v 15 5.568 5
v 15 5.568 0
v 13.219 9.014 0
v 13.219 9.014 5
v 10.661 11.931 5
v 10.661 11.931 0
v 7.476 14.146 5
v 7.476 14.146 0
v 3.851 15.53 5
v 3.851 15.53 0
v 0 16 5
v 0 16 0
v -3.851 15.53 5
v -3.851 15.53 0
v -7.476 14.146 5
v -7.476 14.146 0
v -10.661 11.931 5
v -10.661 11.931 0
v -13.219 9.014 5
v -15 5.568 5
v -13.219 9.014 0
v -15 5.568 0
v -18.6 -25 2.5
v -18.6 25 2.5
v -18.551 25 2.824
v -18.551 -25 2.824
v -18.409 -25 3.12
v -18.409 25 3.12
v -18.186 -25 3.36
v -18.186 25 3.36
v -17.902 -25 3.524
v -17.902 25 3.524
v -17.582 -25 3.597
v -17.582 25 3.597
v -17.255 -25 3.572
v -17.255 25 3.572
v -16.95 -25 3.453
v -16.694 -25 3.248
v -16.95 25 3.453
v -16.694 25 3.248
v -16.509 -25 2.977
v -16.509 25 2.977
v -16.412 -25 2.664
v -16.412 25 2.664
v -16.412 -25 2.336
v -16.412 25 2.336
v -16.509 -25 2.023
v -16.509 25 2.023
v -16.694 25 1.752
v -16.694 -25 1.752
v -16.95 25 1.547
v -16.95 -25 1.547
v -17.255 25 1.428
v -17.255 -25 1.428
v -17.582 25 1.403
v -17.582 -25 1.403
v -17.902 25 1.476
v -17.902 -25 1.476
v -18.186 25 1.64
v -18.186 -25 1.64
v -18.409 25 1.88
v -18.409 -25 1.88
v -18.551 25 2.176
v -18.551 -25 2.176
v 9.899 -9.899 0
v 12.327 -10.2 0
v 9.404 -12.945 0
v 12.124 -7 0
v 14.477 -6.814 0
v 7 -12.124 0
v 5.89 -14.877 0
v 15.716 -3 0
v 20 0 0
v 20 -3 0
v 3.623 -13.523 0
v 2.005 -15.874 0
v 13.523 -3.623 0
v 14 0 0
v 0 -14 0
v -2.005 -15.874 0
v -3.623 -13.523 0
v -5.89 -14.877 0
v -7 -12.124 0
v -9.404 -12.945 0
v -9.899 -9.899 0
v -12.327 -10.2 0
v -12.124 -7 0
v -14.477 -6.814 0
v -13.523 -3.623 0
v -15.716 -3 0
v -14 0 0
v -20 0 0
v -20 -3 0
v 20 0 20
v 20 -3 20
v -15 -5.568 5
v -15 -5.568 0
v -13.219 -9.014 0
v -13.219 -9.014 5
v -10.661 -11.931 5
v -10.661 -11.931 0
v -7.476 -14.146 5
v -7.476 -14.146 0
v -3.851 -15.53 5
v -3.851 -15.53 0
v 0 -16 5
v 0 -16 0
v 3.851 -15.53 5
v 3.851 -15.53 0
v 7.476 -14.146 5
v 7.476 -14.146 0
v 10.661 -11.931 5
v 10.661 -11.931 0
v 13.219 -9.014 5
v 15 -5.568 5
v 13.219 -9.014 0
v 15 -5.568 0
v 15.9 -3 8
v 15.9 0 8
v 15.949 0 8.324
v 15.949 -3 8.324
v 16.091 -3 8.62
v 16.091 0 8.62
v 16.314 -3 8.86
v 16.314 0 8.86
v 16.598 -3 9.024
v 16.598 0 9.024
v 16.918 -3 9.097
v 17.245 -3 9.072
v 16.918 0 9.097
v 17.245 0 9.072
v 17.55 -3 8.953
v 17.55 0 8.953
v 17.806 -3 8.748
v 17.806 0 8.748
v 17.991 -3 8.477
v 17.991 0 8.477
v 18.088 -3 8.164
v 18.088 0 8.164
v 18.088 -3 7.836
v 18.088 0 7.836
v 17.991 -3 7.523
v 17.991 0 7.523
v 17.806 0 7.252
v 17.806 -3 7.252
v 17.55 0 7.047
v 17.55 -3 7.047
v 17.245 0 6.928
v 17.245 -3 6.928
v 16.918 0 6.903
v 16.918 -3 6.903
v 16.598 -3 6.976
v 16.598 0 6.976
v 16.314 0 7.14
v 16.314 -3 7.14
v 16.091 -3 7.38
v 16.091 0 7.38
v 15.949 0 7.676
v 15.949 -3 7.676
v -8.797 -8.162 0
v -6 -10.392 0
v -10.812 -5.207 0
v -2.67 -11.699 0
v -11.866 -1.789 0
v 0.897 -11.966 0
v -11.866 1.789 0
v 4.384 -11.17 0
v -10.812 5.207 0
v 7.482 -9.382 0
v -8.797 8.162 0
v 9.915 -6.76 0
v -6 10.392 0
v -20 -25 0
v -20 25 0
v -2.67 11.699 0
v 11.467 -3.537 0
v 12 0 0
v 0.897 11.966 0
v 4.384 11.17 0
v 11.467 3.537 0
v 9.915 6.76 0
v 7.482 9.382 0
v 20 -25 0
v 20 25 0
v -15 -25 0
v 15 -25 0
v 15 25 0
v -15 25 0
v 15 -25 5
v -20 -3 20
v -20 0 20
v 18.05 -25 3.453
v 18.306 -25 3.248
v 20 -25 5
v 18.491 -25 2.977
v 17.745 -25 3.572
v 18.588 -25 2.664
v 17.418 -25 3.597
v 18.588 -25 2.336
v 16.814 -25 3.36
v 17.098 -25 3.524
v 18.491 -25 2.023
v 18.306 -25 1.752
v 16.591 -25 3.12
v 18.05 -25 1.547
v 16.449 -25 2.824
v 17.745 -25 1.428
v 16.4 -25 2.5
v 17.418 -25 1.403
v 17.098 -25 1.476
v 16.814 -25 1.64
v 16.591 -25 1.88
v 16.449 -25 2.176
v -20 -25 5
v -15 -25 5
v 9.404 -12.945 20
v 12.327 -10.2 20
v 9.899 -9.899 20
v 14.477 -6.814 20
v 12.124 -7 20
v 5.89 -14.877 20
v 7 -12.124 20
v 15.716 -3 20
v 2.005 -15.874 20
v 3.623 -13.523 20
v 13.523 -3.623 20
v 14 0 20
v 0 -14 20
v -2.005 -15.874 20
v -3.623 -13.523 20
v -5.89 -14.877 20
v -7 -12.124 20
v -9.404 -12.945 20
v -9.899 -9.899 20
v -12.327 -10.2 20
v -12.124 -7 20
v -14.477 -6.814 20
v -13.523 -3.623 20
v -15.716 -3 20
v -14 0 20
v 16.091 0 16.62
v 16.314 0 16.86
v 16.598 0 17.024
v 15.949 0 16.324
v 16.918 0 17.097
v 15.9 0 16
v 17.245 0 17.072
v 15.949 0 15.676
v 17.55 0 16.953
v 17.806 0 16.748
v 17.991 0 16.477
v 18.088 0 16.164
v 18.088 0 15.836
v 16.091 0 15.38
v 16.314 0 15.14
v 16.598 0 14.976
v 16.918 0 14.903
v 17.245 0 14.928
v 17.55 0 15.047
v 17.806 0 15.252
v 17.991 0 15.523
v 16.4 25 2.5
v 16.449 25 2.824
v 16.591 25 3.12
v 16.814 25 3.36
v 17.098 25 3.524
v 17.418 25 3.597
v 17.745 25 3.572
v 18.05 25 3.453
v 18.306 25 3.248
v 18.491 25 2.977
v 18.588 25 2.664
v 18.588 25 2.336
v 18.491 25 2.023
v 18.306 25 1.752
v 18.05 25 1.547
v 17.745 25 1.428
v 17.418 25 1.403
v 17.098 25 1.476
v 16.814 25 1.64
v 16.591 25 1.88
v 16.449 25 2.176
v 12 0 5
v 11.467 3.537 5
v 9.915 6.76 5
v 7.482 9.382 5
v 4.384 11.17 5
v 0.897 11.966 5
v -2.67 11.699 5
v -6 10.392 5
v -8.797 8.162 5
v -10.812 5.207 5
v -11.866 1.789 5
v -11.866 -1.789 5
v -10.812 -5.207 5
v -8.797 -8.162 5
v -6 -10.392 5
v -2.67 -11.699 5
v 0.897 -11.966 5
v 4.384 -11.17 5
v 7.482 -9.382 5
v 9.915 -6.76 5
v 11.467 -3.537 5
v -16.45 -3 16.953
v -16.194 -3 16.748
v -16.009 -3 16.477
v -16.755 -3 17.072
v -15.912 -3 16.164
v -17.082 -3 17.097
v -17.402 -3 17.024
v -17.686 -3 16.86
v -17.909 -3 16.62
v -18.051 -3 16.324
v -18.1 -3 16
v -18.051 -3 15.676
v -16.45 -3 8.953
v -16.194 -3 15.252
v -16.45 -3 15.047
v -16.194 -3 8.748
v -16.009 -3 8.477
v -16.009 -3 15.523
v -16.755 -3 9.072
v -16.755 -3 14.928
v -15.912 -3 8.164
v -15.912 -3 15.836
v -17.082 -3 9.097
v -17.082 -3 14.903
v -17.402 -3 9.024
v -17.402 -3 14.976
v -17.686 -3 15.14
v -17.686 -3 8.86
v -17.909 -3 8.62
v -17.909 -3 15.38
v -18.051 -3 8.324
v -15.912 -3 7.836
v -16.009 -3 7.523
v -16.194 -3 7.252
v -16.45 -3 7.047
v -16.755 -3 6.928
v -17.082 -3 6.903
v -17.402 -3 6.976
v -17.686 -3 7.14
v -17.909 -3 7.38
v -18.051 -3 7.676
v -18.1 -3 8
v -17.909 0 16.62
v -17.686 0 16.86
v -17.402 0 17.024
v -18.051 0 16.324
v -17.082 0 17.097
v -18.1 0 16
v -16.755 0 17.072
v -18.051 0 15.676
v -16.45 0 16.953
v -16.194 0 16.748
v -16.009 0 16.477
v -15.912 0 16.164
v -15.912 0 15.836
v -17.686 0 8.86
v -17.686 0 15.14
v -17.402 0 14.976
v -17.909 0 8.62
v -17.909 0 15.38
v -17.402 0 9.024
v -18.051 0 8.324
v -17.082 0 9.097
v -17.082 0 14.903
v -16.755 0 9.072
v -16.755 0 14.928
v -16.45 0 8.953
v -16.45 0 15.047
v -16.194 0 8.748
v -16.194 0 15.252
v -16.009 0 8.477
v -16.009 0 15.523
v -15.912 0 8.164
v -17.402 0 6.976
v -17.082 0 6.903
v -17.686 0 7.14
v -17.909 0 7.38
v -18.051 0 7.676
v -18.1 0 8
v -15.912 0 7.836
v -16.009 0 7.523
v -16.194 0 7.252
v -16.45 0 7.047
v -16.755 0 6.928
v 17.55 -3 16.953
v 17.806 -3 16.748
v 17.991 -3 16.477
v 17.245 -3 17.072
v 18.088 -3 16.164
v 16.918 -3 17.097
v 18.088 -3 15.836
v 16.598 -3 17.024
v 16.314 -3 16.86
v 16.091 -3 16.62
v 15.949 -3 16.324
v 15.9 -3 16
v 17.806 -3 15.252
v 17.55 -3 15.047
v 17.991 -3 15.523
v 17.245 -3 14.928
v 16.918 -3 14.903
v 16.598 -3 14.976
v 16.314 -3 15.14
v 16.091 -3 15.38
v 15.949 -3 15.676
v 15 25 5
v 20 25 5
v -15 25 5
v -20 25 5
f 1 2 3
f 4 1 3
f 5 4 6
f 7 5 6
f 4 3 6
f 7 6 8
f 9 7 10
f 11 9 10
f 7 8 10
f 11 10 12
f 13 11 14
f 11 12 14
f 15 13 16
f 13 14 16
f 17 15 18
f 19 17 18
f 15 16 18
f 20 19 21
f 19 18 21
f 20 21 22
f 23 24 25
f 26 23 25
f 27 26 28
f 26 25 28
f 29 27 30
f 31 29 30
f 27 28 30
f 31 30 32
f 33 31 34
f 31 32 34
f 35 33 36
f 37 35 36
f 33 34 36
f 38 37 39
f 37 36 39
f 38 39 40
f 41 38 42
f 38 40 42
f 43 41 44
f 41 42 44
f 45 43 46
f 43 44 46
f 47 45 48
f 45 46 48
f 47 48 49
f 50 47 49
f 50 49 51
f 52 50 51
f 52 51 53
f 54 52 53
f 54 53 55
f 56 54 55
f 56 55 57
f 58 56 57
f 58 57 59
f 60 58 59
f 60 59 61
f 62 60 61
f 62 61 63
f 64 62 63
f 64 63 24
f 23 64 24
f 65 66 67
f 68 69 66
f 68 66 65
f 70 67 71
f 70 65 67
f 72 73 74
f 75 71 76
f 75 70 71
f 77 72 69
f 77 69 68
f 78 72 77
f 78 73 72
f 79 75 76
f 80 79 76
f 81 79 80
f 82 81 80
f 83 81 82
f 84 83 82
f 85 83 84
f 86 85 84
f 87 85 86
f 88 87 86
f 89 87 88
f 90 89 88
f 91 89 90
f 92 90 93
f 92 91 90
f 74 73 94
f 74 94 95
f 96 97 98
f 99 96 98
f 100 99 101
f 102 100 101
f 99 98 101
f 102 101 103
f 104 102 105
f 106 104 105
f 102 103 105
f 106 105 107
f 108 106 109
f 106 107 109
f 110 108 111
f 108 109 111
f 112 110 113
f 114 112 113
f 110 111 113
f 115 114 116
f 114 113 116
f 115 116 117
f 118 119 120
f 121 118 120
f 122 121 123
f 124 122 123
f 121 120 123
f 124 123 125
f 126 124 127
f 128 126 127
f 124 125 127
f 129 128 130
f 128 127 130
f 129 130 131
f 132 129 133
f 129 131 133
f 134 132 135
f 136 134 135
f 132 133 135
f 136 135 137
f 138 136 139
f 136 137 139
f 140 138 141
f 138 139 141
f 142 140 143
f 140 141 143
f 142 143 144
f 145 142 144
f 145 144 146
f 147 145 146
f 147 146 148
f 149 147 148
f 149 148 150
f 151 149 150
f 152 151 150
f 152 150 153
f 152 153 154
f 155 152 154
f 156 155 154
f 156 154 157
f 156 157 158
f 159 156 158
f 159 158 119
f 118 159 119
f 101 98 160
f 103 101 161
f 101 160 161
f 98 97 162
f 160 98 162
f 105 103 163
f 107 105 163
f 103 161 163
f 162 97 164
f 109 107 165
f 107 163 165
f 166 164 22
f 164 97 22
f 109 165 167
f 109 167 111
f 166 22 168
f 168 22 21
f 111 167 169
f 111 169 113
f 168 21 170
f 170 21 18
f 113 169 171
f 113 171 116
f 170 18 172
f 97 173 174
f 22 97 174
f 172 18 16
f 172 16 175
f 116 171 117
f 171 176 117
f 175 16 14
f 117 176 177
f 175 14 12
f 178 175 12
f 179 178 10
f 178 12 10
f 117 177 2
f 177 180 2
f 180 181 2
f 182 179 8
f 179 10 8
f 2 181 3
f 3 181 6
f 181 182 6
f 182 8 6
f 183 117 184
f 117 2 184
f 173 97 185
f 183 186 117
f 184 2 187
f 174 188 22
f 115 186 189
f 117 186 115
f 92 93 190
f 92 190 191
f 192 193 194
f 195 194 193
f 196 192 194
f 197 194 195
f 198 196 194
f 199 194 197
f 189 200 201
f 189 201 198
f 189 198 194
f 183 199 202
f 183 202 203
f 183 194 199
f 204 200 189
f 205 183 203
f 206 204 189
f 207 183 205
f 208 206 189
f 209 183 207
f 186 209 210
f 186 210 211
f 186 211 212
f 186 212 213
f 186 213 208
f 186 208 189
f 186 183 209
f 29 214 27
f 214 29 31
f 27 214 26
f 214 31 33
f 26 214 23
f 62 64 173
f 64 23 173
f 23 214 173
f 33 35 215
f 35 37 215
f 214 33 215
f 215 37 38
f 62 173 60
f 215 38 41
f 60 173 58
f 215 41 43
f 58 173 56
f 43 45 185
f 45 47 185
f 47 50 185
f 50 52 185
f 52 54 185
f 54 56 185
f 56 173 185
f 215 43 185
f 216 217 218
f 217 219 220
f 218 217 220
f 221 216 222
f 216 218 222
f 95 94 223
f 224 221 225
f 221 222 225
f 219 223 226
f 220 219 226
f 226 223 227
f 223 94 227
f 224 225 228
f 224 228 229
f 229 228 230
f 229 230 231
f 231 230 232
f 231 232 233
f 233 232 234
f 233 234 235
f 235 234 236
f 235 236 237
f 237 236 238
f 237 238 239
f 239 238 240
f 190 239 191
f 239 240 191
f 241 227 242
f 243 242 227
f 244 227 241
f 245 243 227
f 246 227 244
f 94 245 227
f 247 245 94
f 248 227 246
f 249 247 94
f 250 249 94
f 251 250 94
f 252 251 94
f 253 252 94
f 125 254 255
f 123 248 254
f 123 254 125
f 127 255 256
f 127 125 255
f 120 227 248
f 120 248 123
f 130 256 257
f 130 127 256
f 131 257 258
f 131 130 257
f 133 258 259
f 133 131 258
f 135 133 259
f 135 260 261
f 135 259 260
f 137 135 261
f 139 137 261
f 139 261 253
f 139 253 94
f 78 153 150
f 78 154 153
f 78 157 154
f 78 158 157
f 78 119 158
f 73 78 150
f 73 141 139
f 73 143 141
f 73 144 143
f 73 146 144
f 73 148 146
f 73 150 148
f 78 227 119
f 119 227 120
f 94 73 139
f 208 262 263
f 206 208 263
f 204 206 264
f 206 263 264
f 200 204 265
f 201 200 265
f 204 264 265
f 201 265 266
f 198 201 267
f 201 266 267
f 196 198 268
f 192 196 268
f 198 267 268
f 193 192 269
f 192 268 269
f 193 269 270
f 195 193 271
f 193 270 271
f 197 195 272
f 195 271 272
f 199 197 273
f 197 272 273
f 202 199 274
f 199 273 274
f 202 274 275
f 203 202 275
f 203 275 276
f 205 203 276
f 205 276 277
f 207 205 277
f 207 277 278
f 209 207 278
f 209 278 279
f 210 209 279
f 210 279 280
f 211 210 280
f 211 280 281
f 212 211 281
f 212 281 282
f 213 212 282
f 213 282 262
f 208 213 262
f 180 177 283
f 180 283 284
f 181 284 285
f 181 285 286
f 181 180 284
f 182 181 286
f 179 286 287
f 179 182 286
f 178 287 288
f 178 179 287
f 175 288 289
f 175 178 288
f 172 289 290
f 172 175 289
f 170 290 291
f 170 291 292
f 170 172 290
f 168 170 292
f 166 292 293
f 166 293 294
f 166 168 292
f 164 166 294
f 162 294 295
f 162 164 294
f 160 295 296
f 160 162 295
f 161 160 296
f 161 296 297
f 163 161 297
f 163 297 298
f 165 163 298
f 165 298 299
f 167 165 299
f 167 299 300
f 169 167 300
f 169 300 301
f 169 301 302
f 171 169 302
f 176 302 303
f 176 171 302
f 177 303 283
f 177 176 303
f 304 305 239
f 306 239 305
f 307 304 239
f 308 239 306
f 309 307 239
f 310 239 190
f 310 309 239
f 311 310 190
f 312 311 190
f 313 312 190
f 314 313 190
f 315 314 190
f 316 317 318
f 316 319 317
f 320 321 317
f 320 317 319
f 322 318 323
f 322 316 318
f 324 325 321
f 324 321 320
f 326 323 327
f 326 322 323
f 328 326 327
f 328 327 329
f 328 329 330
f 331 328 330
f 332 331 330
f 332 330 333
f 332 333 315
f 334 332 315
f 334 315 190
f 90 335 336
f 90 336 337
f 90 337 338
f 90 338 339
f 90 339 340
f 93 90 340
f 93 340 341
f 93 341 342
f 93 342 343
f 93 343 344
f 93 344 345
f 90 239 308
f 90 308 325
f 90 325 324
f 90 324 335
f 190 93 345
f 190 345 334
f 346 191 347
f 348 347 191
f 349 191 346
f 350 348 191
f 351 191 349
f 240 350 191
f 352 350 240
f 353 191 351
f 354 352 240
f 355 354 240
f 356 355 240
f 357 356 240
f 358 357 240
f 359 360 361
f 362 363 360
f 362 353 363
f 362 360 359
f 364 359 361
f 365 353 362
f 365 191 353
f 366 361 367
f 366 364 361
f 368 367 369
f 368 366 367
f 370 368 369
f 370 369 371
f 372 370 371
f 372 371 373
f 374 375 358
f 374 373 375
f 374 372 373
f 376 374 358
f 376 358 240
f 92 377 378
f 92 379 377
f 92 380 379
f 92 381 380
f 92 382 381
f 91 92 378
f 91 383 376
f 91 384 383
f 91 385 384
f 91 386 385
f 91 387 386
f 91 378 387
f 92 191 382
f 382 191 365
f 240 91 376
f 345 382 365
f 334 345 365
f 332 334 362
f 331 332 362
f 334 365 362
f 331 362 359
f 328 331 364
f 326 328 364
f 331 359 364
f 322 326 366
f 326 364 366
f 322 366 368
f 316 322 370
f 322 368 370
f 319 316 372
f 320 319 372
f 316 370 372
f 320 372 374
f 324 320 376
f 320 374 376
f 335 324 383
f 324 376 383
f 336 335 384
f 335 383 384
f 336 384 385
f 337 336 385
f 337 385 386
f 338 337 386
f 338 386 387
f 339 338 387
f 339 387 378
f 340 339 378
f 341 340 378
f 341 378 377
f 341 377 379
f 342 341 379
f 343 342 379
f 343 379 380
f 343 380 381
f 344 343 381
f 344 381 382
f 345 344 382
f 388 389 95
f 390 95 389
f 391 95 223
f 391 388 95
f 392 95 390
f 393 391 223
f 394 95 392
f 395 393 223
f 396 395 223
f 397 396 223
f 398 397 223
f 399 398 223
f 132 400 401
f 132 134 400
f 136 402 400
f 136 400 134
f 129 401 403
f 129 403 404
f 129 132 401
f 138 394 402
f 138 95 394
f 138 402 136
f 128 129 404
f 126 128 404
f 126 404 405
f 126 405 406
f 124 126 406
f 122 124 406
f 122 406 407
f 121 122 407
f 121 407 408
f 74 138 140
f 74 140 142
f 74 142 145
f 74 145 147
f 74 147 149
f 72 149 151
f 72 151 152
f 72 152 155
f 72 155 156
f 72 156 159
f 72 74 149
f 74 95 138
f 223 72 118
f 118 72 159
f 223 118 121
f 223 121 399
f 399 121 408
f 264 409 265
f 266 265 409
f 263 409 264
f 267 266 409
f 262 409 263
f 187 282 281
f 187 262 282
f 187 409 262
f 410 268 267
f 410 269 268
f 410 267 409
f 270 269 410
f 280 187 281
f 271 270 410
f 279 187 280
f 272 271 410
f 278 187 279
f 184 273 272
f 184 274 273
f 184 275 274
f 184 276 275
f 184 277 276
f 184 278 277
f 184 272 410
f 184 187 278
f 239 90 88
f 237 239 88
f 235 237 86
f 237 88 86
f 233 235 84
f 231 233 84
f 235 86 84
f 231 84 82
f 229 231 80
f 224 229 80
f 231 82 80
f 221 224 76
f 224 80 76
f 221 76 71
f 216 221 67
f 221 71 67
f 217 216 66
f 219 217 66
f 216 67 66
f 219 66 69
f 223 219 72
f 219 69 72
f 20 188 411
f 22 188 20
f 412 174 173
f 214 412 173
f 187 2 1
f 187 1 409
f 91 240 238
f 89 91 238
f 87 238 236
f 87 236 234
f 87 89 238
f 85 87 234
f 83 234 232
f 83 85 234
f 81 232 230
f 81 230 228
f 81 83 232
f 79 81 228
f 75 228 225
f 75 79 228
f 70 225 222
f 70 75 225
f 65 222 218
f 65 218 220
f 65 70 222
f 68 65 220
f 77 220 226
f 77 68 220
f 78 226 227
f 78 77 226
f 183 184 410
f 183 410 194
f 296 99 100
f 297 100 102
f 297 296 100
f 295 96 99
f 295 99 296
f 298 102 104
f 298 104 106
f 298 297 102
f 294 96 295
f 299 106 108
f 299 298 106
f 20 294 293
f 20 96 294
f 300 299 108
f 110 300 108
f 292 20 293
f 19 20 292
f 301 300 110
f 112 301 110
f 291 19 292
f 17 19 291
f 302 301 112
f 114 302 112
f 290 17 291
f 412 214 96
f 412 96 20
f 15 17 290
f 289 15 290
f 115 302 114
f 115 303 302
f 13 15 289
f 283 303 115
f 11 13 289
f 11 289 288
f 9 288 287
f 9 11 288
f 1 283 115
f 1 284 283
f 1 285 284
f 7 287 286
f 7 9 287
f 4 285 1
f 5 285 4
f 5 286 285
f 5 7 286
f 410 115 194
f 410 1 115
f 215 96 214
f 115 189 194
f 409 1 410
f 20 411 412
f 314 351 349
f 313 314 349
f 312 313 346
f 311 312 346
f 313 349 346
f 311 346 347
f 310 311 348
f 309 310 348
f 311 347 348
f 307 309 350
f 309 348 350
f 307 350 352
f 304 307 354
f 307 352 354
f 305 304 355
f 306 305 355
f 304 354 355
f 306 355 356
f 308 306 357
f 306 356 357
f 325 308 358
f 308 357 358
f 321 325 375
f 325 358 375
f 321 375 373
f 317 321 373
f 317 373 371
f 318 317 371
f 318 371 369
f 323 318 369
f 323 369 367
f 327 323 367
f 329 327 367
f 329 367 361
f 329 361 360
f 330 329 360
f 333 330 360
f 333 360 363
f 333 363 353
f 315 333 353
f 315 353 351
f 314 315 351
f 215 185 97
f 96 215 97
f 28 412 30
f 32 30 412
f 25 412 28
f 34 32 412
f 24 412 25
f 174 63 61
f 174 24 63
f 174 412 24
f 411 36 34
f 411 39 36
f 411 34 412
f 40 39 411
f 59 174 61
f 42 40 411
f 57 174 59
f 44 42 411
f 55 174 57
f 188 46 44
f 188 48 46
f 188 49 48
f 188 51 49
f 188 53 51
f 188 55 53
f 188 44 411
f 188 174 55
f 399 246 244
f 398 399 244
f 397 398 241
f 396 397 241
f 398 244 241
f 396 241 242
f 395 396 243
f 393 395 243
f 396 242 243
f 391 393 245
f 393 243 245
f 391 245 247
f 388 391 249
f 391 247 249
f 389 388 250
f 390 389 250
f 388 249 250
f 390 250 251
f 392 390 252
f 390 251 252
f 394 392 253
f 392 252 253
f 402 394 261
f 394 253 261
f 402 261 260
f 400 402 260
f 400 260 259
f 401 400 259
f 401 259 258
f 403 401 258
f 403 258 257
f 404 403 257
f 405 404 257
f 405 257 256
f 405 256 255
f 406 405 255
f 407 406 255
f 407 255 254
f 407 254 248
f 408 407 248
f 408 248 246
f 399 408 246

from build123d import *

# Parameters (mm, degrees)
PAD001_DEPTH    = 20
SKETCH002_R     = 1.1
POCKET_DEPTH    = 16.001
SKETCH_R        = 12
PAD_DEPTH       = 5
SKETCH003_R     = 1.1
POCKET001_DEPTH = 50.001


with BuildPart() as fastenerholesbracket:
    # Sketch001 → Pad001 (new body)
    with BuildSketch(Plane.XY):
        with BuildLine():
            Line((-15.716234, -3), (-20, -3))
            Line((-20, -3), (-20, 0))
            Line((-20, 0), (-14, 0))
            ThreePointArc((-14, 0), (0, -14), (14, 0))
            Line((14, 0), (20, 0))
            Line((20, 0), (20, -3))
            Line((20, -3), (15.716234, -3))
            ThreePointArc((-15.716234, -3), (0, -16), (15.716234, -3))
        make_face()
    extrude(amount=PAD001_DEPTH)

    # Sketch002 → Pocket (cut, through all)
    with BuildSketch(Plane(origin=(0, 0, 0), x_dir=(-1, 0, 0), z_dir=(0, 1, 0))):
        with Locations((-17, 16)):
            Circle(SKETCH002_R)
        with Locations((-17, 8)):
            Circle(SKETCH002_R)
        with Locations((17, 16)):
            Circle(SKETCH002_R)
        with Locations((17, 8)):
            Circle(SKETCH002_R)
    extrude(amount=-POCKET_DEPTH, mode=Mode.SUBTRACT)


with BuildPart() as fastenerholespocket:
    # Sketch → Pad (new body)
    with BuildSketch(Plane.XY):
        with BuildLine():
            Line((-20, 25), (-20, -25))
            Line((-20, -25), (-15, -25))
            Line((-15, -25), (-15, -5.567764))
            ThreePointArc((-15, -5.567764), (0, -16), (15, -5.567764))
            Line((15, -25), (15, -5.567764))
            Line((20, -25), (15, -25))
            Line((20, 25), (20, -25))
            Line((15, 25), (20, 25))
            Line((15, 5.567764), (15, 25))
            ThreePointArc((15, 5.567764), (0, 16), (-15, 5.567764))
            Line((-15, 25), (-15, 5.567764))
            Line((-20, 25), (-15, 25))
        make_face()
        Circle(SKETCH_R, mode=Mode.SUBTRACT)
    extrude(amount=PAD_DEPTH)

    # Sketch003 → Pocket001 (cut, through all)
    with BuildSketch(Plane(origin=(0, 25, 0), x_dir=(-1, 0, 0), z_dir=(0, 1, 0))):
        with Locations((-17.5, 2.5)):
            Circle(SKETCH003_R)
        with Locations((17.5, 2.5)):
            Circle(SKETCH003_R)
    extrude(amount=-POCKET001_DEPTH, mode=Mode.SUBTRACT)


solid = Compound([fastenerholesbracket.part, fastenerholespocket.part])
